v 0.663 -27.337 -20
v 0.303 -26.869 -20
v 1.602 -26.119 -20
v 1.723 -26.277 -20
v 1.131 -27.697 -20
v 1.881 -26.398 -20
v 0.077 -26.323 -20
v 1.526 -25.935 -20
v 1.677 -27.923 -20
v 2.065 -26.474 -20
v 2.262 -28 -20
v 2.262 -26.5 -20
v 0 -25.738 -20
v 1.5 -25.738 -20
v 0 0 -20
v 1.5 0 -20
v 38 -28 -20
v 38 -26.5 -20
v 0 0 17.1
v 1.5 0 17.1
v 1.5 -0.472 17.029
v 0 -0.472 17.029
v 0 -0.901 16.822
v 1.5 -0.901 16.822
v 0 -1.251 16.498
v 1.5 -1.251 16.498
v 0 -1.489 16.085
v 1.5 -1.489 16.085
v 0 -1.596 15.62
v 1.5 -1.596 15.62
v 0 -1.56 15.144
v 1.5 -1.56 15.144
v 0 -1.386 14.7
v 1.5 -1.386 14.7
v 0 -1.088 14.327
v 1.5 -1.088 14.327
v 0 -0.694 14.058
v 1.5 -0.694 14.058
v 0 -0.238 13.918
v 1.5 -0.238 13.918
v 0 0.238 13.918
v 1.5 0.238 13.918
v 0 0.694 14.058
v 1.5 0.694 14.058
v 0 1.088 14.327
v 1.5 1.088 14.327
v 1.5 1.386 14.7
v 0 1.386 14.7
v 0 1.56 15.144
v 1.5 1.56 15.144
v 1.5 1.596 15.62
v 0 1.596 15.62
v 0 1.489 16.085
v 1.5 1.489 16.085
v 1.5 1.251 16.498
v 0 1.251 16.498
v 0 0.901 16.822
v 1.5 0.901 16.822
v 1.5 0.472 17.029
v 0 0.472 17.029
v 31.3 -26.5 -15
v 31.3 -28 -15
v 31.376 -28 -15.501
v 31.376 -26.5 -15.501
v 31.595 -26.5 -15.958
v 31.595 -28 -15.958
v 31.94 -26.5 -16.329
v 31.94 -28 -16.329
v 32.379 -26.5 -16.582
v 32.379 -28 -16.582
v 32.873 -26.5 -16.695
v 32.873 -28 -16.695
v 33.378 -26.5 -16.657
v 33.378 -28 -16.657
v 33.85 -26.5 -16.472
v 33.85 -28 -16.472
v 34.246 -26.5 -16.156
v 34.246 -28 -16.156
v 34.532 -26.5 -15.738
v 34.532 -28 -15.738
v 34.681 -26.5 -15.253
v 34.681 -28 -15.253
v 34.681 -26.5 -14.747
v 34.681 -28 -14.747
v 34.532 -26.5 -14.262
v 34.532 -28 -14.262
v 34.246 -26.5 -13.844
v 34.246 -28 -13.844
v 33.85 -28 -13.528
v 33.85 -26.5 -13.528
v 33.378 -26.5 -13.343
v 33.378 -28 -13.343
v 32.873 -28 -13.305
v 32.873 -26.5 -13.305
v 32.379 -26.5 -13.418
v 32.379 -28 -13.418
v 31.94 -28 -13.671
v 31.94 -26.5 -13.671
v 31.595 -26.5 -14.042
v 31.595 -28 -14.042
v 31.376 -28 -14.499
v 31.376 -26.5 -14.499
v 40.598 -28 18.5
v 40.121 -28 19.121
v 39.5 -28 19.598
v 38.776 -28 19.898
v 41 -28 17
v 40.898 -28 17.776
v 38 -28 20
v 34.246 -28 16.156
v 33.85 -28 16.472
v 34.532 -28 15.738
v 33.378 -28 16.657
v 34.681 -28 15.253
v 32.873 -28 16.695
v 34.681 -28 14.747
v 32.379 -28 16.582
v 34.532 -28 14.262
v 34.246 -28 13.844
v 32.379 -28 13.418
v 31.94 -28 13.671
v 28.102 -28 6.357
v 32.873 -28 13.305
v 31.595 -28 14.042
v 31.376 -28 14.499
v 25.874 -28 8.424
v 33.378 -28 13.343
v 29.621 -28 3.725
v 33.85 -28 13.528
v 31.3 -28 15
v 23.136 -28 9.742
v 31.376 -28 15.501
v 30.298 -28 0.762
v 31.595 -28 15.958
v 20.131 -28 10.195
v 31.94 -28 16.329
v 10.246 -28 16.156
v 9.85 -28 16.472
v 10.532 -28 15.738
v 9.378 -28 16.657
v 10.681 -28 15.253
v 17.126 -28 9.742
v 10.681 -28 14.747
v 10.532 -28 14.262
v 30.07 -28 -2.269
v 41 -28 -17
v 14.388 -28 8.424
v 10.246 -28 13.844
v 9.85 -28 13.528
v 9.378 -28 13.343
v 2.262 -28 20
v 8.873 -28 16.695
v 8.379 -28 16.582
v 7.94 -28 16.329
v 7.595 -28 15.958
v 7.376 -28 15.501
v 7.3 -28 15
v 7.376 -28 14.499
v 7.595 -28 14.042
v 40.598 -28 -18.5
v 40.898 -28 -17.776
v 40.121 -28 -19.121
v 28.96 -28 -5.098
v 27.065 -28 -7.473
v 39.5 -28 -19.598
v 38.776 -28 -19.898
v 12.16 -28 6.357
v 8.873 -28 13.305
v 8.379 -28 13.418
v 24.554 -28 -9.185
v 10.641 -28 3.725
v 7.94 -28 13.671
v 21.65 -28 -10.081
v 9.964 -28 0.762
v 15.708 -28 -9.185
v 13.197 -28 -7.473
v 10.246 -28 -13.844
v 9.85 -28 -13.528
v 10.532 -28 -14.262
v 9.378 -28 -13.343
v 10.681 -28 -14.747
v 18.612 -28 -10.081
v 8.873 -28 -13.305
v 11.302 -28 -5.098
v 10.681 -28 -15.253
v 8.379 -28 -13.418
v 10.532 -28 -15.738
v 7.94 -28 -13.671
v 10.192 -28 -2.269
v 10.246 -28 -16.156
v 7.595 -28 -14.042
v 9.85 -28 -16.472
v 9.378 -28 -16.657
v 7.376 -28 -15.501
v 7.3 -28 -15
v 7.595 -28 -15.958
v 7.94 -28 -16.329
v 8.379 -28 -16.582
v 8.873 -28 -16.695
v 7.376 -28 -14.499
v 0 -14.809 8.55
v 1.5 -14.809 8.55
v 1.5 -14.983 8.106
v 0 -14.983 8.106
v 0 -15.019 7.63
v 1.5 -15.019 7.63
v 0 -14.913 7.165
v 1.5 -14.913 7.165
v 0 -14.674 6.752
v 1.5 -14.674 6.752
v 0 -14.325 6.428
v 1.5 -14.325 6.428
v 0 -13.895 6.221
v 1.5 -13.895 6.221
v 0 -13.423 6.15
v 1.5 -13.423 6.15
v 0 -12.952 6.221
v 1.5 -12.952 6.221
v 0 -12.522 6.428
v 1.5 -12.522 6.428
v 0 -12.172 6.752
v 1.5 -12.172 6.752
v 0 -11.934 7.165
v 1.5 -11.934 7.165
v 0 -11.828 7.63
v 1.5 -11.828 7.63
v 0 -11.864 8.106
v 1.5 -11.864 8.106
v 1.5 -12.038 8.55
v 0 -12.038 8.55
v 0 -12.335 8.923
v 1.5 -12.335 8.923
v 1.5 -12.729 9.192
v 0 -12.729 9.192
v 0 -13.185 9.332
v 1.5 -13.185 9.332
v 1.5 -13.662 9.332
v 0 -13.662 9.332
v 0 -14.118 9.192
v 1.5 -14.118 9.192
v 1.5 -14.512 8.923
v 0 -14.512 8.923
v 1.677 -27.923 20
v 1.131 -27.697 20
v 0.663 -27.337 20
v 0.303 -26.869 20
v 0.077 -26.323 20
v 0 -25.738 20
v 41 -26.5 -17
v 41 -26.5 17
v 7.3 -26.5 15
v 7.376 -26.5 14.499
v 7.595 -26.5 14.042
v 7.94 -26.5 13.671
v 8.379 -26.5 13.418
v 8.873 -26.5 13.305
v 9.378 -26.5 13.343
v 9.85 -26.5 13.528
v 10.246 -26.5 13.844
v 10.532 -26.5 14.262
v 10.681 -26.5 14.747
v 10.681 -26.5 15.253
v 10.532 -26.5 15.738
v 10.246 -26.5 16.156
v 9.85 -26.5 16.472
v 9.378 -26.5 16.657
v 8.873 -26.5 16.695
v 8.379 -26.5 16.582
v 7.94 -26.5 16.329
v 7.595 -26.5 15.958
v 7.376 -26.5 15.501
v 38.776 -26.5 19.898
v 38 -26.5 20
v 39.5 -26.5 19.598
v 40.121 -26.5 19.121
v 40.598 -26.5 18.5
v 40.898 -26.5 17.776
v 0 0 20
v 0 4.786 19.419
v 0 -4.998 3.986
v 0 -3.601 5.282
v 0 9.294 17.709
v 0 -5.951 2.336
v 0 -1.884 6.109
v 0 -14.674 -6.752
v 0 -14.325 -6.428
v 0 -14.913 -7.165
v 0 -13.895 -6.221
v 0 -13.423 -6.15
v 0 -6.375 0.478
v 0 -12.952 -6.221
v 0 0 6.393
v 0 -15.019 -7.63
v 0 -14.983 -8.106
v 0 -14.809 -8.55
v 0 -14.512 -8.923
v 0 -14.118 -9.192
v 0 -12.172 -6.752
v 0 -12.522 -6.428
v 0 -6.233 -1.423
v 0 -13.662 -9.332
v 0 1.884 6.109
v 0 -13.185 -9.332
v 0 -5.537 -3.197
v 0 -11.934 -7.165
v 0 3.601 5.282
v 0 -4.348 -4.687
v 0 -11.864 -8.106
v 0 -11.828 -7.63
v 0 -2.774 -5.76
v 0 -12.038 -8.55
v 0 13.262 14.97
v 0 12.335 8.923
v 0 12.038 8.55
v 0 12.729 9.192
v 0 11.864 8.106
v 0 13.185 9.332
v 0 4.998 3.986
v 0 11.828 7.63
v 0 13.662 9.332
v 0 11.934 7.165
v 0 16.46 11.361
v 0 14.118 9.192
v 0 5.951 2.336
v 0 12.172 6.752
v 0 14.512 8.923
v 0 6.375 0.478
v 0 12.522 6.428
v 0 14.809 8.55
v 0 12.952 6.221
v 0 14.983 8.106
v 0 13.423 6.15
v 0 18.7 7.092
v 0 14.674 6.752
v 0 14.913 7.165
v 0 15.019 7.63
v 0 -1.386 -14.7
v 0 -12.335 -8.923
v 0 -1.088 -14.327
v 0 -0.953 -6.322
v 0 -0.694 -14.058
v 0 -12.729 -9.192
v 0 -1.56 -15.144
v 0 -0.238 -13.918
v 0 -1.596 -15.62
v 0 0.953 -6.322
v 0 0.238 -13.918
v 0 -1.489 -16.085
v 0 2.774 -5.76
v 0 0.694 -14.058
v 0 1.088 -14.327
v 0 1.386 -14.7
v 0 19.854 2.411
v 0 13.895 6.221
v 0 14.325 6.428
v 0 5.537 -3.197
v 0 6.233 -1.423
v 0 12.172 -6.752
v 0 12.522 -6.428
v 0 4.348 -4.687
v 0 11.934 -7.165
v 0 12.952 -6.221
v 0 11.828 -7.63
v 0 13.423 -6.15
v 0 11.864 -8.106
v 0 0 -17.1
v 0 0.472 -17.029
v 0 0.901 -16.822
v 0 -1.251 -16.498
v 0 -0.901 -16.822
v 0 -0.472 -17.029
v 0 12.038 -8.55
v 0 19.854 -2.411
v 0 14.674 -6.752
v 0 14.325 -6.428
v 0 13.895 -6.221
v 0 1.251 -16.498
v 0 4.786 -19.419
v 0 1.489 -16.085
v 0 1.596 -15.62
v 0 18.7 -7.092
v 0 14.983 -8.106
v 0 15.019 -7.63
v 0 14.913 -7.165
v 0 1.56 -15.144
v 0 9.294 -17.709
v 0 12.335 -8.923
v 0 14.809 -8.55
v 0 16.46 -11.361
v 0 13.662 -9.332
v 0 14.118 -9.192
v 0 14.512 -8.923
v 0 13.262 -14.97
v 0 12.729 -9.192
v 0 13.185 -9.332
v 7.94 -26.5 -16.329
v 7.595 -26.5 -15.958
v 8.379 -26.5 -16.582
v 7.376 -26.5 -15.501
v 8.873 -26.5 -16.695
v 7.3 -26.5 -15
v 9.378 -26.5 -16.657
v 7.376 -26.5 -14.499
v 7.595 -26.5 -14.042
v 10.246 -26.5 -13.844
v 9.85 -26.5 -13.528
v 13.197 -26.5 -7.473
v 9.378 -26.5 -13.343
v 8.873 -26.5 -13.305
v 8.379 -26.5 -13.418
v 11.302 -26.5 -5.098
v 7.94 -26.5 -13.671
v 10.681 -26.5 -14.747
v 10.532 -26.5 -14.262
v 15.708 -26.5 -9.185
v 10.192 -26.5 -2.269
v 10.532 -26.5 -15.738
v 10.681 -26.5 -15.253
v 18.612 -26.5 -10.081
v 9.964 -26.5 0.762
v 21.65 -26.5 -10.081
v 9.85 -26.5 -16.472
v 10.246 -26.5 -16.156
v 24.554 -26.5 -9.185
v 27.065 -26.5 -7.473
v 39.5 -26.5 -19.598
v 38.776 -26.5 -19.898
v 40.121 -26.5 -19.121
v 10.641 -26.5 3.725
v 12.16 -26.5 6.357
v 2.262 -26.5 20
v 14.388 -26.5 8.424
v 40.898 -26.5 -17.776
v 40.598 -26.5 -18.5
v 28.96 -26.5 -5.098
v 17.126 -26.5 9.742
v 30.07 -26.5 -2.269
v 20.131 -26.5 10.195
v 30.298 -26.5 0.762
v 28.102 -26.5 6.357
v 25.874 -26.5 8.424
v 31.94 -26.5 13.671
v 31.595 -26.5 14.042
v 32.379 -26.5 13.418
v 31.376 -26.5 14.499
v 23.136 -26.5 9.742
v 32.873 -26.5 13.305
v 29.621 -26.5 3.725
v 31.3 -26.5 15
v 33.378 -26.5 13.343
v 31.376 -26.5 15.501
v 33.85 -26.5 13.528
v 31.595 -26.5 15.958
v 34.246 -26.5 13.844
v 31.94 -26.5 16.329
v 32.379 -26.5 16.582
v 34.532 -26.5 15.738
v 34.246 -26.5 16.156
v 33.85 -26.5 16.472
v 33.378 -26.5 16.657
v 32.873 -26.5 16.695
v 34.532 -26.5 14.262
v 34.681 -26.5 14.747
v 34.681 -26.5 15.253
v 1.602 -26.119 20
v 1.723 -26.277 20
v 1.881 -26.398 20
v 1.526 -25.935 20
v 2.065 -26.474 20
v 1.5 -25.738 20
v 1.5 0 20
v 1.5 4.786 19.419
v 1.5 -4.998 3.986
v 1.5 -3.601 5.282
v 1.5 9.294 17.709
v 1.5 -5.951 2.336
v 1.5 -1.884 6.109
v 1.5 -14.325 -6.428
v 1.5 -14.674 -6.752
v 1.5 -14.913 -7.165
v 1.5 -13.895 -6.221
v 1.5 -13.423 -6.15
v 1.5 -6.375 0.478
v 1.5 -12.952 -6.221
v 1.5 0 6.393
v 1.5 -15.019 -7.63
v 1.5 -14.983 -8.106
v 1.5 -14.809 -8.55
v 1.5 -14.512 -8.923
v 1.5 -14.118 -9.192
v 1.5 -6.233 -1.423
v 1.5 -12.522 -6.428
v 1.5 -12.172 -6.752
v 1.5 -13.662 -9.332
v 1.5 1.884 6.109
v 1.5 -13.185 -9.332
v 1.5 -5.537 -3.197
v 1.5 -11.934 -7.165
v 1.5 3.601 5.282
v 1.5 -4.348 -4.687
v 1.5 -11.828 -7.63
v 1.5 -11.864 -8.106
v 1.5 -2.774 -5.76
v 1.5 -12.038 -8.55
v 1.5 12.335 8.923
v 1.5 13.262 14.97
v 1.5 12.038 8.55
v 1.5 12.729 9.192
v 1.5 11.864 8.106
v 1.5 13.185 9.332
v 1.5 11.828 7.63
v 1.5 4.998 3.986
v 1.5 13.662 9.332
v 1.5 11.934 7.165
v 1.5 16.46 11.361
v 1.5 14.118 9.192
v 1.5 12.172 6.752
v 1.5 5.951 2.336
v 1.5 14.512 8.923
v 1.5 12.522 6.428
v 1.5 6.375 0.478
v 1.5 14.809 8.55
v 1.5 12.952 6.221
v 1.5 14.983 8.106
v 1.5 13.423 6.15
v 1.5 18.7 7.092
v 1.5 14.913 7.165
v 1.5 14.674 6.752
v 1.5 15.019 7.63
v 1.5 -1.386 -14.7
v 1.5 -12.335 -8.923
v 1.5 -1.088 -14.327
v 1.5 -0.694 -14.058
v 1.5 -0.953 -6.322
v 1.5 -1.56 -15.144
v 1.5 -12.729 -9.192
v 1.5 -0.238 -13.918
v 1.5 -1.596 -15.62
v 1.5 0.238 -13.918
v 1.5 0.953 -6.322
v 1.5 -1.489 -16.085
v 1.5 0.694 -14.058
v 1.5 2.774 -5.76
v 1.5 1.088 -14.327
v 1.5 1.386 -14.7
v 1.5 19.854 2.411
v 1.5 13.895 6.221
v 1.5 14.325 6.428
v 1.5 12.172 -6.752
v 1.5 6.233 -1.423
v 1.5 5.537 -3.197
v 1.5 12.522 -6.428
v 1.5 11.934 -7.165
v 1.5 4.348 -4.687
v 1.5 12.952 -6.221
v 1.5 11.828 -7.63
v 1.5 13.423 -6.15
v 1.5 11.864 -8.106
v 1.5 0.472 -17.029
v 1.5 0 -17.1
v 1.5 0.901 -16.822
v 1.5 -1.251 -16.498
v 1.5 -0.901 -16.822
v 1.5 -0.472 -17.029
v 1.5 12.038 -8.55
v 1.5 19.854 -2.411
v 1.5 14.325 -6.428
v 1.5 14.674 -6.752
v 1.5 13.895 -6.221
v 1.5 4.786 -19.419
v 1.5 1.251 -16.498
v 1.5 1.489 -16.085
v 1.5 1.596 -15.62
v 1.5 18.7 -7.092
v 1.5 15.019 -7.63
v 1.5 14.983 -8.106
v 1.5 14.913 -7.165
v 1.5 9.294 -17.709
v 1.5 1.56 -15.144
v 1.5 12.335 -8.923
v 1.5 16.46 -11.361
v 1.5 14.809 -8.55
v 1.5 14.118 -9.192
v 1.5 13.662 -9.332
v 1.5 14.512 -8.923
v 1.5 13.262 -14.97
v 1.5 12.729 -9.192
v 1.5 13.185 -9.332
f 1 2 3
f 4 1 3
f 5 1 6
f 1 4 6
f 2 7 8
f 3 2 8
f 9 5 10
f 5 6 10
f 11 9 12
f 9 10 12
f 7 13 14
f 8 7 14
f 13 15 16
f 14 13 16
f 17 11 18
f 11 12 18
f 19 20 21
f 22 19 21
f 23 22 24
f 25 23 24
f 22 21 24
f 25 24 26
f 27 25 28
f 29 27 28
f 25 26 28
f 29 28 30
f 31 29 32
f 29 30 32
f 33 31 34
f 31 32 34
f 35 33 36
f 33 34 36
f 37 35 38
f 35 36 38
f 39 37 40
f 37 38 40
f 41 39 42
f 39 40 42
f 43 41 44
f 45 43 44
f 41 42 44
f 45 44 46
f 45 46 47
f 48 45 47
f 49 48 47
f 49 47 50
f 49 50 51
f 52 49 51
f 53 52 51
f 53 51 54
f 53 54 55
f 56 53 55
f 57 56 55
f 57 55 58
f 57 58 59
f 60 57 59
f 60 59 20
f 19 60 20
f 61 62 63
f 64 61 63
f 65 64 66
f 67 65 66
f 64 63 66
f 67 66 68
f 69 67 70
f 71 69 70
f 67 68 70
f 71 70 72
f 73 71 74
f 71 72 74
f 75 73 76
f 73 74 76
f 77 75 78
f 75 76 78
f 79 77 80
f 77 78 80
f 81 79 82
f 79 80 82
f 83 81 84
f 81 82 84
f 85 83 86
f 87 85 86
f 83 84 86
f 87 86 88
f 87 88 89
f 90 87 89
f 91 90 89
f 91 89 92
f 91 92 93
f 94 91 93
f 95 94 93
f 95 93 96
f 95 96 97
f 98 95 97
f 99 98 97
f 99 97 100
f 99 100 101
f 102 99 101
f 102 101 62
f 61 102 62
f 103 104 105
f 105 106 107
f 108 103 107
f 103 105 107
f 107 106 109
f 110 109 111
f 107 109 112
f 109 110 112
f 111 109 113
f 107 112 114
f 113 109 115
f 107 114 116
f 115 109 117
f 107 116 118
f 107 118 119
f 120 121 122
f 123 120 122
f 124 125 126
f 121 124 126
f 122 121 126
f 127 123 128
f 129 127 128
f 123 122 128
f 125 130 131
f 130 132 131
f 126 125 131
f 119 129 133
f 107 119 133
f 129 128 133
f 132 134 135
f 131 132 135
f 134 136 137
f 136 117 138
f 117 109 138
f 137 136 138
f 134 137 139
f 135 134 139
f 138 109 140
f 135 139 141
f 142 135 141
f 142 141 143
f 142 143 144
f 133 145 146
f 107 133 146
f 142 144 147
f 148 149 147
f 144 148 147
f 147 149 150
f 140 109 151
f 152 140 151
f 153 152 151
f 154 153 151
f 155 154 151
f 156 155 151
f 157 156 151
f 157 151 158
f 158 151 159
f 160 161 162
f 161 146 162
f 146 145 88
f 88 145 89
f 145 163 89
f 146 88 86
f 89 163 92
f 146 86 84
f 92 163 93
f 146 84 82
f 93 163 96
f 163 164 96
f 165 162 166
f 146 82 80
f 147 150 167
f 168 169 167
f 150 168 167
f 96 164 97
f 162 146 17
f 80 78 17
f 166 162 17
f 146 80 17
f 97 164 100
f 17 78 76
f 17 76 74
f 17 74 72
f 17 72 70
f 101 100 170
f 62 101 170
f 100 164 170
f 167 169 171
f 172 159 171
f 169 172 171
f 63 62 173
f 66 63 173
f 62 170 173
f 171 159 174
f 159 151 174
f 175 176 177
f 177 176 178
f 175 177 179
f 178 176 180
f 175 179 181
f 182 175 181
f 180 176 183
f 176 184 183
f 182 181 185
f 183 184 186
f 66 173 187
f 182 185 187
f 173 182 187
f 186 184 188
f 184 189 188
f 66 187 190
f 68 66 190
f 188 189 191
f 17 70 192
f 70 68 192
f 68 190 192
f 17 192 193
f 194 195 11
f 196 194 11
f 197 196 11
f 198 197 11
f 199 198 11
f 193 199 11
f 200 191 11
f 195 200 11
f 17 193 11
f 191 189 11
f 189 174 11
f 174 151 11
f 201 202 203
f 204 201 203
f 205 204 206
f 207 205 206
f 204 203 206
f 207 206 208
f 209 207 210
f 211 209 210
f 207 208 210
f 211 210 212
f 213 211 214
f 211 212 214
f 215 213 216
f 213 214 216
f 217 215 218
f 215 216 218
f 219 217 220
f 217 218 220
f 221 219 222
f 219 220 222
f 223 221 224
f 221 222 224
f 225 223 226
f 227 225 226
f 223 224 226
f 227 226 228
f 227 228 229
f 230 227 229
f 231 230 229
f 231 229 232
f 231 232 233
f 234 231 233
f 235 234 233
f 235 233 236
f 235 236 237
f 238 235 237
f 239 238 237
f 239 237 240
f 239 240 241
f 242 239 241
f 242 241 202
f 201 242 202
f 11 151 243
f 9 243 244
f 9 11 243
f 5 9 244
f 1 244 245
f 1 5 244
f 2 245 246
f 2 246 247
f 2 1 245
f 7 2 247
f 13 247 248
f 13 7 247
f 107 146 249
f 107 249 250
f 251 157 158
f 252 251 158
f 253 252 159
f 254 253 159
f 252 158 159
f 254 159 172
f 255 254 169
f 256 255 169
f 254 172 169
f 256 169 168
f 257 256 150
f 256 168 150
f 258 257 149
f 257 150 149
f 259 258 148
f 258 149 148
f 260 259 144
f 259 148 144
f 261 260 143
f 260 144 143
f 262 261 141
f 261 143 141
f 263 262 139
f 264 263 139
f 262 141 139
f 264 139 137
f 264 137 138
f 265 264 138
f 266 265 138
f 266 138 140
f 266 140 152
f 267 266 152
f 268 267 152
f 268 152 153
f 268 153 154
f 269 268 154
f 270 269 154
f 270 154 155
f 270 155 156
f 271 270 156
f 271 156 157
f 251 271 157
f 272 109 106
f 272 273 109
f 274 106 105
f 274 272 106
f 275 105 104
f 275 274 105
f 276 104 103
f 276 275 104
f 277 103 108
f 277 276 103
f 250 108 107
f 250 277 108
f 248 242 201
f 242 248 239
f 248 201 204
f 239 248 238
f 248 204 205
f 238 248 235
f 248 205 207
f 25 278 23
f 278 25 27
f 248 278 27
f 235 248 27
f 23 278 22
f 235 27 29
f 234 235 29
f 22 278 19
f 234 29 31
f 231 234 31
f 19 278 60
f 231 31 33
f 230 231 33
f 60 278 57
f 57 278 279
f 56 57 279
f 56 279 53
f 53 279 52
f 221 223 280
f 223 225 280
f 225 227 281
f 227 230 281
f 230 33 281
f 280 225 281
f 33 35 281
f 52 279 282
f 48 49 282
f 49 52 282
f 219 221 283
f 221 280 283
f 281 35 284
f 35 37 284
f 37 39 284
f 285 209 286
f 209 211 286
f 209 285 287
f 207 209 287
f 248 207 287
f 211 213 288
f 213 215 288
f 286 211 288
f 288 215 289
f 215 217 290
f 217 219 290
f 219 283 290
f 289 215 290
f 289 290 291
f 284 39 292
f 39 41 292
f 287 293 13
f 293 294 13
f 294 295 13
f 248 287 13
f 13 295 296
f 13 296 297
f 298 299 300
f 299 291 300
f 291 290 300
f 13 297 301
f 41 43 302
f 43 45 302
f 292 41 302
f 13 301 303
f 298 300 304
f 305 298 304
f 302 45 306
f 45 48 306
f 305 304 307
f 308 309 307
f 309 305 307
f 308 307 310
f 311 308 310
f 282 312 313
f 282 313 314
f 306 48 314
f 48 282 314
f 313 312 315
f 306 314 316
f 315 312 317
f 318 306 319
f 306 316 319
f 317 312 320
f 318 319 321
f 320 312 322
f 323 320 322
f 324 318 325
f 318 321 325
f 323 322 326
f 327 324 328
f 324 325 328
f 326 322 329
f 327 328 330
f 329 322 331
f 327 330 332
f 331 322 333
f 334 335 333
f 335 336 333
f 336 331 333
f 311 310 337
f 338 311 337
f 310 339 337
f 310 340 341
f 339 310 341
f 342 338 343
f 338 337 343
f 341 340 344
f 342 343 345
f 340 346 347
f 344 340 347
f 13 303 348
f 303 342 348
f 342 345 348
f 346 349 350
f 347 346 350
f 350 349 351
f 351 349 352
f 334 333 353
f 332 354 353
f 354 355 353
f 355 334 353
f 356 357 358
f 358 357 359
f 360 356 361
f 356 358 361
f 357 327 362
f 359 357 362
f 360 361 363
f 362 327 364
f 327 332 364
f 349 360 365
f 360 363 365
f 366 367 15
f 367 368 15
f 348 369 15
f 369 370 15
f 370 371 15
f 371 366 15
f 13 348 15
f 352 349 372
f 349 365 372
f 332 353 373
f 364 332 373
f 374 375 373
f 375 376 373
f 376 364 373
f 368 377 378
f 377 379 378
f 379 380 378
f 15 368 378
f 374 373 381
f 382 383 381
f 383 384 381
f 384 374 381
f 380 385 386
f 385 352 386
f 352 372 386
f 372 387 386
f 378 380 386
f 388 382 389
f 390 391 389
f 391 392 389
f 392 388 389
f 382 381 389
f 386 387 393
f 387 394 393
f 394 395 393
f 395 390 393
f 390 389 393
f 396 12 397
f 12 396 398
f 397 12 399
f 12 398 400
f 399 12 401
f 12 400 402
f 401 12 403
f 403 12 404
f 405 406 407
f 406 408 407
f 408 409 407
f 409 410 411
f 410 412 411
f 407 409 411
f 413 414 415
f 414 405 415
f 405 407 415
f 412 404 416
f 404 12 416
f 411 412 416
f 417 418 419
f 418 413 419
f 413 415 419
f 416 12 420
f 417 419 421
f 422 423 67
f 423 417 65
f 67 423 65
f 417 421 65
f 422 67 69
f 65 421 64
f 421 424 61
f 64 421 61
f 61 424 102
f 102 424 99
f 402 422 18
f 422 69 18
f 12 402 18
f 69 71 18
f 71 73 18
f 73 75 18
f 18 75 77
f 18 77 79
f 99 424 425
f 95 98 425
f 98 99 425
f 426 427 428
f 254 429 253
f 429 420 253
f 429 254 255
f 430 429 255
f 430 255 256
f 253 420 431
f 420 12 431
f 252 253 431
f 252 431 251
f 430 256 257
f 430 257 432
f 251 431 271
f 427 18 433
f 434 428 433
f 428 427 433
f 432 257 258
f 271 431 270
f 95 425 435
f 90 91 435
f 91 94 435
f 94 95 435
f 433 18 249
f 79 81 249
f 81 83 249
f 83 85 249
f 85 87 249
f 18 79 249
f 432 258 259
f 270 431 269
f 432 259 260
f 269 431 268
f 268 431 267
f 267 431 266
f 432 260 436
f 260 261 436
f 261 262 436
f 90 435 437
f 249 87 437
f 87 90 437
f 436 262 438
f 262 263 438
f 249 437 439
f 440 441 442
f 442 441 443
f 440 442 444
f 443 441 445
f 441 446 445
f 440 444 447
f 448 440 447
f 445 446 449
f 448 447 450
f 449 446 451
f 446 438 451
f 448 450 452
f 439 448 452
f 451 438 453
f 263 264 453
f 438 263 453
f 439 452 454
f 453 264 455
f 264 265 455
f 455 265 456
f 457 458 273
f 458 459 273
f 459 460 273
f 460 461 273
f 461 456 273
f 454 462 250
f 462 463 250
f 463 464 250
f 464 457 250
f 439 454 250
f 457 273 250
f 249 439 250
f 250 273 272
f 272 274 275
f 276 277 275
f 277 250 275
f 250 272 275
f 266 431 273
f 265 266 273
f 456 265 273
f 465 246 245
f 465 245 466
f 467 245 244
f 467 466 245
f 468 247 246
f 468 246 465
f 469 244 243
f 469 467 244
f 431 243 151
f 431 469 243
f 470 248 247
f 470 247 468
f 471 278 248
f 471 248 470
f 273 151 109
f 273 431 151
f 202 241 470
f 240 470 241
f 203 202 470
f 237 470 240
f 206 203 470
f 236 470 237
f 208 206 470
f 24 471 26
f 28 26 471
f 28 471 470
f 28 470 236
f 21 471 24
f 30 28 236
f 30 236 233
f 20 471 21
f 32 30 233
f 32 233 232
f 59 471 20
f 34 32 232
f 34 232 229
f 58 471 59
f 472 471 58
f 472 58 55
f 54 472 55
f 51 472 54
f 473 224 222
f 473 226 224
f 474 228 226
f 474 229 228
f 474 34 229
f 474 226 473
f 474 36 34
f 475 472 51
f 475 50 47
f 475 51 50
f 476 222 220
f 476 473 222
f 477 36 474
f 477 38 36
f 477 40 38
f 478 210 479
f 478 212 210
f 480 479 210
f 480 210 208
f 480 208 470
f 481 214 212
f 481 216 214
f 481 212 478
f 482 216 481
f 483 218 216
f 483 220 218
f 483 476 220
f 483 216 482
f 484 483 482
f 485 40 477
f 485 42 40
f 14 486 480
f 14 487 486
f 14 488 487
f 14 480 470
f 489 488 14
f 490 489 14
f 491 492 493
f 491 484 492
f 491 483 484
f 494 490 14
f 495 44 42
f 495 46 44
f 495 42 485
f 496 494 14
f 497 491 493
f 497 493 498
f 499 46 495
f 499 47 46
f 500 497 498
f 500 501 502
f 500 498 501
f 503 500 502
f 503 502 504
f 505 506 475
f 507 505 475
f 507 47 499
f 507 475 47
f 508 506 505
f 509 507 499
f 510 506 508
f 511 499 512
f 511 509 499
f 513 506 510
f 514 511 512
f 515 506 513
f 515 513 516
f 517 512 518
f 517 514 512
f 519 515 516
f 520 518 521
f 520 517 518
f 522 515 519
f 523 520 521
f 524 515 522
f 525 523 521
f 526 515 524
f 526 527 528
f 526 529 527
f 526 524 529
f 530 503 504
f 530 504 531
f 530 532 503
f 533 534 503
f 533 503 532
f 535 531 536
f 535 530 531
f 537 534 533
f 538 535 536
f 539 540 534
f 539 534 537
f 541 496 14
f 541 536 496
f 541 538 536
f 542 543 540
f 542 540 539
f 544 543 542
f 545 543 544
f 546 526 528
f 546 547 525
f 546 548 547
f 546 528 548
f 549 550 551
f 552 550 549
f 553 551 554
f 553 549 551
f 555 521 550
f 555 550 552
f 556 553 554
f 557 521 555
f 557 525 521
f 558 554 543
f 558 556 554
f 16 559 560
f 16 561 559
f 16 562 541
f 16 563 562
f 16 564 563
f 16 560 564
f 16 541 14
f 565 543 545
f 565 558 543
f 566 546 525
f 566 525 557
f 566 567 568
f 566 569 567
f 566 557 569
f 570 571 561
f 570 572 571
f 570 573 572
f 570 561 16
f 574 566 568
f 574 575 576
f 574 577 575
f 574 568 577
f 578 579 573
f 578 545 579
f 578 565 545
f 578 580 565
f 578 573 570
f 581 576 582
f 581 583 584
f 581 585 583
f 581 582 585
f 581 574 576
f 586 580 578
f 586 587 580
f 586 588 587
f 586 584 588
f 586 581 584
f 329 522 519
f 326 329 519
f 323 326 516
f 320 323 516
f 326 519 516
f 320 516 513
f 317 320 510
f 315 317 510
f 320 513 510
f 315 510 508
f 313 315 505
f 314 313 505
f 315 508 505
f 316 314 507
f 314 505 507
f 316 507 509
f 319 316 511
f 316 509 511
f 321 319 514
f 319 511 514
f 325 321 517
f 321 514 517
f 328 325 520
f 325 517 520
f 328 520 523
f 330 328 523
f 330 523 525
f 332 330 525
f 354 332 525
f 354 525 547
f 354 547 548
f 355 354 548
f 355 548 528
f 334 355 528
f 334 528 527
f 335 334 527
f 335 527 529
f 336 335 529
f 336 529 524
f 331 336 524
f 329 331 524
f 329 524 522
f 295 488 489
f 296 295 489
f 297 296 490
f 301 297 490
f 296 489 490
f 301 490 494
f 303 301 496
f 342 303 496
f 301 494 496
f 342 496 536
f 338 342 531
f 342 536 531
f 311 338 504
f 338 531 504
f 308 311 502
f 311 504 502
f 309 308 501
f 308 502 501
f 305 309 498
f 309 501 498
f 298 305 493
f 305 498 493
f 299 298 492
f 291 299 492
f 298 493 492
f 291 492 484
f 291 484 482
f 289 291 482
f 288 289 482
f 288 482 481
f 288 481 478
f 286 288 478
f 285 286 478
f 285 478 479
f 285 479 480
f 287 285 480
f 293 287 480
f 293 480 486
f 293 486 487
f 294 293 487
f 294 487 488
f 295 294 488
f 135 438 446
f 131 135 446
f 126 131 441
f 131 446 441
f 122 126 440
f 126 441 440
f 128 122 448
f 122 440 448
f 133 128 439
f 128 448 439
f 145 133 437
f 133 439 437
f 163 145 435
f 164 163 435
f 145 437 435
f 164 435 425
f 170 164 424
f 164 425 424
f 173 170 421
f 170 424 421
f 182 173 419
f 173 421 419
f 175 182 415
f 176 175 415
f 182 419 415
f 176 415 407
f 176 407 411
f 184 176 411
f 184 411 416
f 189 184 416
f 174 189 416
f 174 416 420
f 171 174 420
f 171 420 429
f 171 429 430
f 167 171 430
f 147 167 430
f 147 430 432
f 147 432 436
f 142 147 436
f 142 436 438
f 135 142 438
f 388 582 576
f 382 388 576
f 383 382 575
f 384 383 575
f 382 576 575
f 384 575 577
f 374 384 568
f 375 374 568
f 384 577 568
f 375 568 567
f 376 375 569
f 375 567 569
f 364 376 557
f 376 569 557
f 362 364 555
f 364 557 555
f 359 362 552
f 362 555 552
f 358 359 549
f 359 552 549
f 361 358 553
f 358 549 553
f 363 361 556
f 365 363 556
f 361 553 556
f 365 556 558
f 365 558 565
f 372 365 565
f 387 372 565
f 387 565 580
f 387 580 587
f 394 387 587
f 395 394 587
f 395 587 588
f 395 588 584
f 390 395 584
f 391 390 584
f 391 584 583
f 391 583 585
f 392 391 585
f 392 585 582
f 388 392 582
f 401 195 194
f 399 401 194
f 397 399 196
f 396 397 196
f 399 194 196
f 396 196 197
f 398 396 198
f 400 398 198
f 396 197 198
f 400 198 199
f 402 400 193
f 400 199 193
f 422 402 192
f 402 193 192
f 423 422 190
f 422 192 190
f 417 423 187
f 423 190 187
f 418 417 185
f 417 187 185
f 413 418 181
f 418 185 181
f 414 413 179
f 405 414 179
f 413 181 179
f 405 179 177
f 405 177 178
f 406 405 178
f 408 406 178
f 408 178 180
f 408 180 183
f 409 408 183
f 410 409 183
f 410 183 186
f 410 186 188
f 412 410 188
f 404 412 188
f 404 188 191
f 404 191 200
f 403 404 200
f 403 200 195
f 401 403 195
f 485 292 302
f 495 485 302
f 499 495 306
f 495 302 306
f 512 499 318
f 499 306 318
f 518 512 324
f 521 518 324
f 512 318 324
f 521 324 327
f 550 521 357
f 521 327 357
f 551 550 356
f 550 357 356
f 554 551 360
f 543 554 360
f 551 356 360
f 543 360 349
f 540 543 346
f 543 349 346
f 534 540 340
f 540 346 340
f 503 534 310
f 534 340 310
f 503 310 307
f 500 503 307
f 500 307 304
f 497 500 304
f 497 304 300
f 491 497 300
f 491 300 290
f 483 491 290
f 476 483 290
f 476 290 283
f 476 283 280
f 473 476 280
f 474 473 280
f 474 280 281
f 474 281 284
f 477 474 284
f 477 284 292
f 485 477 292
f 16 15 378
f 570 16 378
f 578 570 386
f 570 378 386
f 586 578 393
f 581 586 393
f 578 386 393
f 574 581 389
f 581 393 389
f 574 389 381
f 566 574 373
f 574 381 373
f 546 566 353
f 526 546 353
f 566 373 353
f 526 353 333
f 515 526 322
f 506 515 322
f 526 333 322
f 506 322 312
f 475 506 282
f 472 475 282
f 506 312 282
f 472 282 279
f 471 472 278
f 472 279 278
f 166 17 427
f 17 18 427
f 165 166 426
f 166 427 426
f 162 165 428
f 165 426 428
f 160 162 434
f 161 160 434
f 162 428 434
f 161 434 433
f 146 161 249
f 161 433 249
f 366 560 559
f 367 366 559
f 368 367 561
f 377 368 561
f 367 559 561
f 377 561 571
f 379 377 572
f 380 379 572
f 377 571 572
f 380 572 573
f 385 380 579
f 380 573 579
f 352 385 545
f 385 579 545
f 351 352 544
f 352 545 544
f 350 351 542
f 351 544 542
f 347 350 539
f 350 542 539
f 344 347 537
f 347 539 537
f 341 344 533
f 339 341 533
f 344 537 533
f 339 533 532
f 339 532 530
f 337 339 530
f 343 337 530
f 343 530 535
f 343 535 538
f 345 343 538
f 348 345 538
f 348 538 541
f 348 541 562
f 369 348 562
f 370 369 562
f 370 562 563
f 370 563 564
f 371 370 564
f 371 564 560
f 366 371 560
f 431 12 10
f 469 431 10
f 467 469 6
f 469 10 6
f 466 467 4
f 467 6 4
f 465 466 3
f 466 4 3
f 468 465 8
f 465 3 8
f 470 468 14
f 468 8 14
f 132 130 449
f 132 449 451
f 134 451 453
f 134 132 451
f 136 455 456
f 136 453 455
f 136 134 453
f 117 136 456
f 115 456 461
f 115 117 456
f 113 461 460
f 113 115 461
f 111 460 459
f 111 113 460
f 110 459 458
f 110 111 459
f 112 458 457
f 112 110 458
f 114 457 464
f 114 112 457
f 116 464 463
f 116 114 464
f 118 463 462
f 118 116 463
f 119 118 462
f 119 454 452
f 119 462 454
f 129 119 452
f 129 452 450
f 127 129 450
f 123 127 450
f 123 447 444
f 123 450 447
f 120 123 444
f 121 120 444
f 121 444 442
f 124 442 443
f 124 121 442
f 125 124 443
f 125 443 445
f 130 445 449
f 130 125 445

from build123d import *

# Parameters (mm, degrees)
BOSS_EXTRUDE1_DEPTH    = 1.5
SKETCH2_W              = 41
SKETCH2_H              = 40
BOSS_EXTRUDE2_DEPTH    = 1.5
CONVERT_SOLID1_START   = -20
CONVERT_SOLID1_DEPTH   = 40
CONVERT_SOLID1_2_DEPTH = 40
M3_CLEARANCE_HOLE1_D   = 3.2
CIRPATTERN1_COUNT      = 6
SKETCH9_R              = 6.393167934
CUT_EXTRUDE1_DEPTH     = 54.525694764
M3_CLEARANCE_HOLE2_D   = 3.4
LPATTERN1_COUNT        = 2
LPATTERN1_PITCH        = 24
LPATTERN1_COPY_1_D     = 3.4
FILLET1_R              = 3
SKETCH12_R             = 10.195045523
CUT_EXTRUDE2_DEPTH     = 10


# Read off the part's stored shape, not the designer's step: Convert-Solid1
with BuildPart() as part:
    # Sketch1 → Boss-Extrude1 (new body)
    with BuildSketch(Plane(origin=(0, 0, 0), x_dir=(0, 0, -1), z_dir=(1, 0, 0))):
        with BuildLine():
            Line((-20, 0), (-20, -28))
            Line((-20, -28), (20, -28))
            Line((20, -28), (20, 0))
            ThreePointArc((20, 0), (0, 20), (-20, 0))
        make_face()
    extrude(amount=BOSS_EXTRUDE1_DEPTH)

    # Sketch2 → Boss-Extrude2 (add)
    with BuildSketch(Plane.XZ.offset(28)):
        with Locations((20.5, 0)):
            Rectangle(SKETCH2_W, SKETCH2_H)
    extrude(amount=-BOSS_EXTRUDE2_DEPTH)

    # Convert-Solid1 outline → Convert-Solid1 (cut)
    with BuildSketch(Plane.XY.offset(CONVERT_SOLID1_START)):
        with BuildLine():
            Line((0, -28), (2.262, -28))
            ThreePointArc((2.262, -28), (0.662524461, -27.337475539), (0, -25.738))
            Line((0, -25.738), (0, -28))
        make_face()
    extrude(amount=CONVERT_SOLID1_DEPTH, mode=Mode.SUBTRACT)

    # Convert-Solid1 2 outline → Convert-Solid1 2 (add)
    with BuildSketch(Plane.XY.offset(CONVERT_SOLID1_START)):
        with BuildLine():
            Line((1.5, -26.5), (2.262, -26.5))
            ThreePointArc((2.262, -26.5), (1.723184633, -26.276815367), (1.5, -25.738))
            Line((1.5, -25.738), (1.5, -26.5))
        make_face()
    extrude(amount=CONVERT_SOLID1_2_DEPTH)

    # M3 Clearance Hole1 (through all)
    with Locations(Plane.ZY):
        with Locations((-15.5, 0)):
            m3_clearance_hole1 = Hole(M3_CLEARANCE_HOLE1_D / 2)

    # CirPattern1: M3 Clearance Hole1 ×6 about axis
    cirpattern1_axis = Axis((0, 0, 0), (1, 0, 0))
    for i in range(1, CIRPATTERN1_COUNT):
        add(m3_clearance_hole1.rotate(cirpattern1_axis, i * 360 / CIRPATTERN1_COUNT), mode=Mode.SUBTRACT)

    # Sketch9 → Cut-Extrude1 (cut, through all)
    with BuildSketch(Plane.ZY):
        Circle(SKETCH9_R)
    extrude(amount=-CUT_EXTRUDE1_DEPTH, mode=Mode.SUBTRACT)

    # M3 Clearance Hole2 (through all)
    with Locations(Plane(origin=(0, -26.5, 0), x_dir=(1, 0, 0), z_dir=(0, 1, 0))):
        with Locations((33, 15)):
            m3_clearance_hole2 = Hole(M3_CLEARANCE_HOLE2_D / 2)

    # Mirror1: M3 Clearance Hole2 across plane
    add(m3_clearance_hole2.mirror(Plane.XY), mode=Mode.SUBTRACT)

    # LPattern1: M3 Clearance Hole2 ×2
    with Locations(*[(-i * LPATTERN1_PITCH, 0, 0) for i in range(1, LPATTERN1_COUNT)]):
        add(m3_clearance_hole2, mode=Mode.SUBTRACT)

    # LPattern1 copy 1 (through all)
    with Locations(Plane(origin=(-24, -26.5, 0), x_dir=(1, 0, 0), z_dir=(0, 1, 0))):
        with Locations((33, -15)):
            Hole(LPATTERN1_COPY_1_D / 2)

    # Fillet1
    fillet1_edges = [part.edges().sort_by_distance(p)[0] for p in [
        (41, -27.25, 20),
        (41, -27.25, -20),
    ]]
    fillet(fillet1_edges, radius=FILLET1_R)

    # Sketch12 → Cut-Extrude2 (cut)
    with BuildSketch(Plane(origin=(0, -26.5, 0), x_dir=(1, 0, 0), z_dir=(0, 1, 0))):
        with Locations(Location((20.131, 0, 0), (0, 0, 270))):
            Circle(SKETCH12_R)
    extrude(amount=-CUT_EXTRUDE2_DEPTH, mode=Mode.SUBTRACT)


solid = part.part
